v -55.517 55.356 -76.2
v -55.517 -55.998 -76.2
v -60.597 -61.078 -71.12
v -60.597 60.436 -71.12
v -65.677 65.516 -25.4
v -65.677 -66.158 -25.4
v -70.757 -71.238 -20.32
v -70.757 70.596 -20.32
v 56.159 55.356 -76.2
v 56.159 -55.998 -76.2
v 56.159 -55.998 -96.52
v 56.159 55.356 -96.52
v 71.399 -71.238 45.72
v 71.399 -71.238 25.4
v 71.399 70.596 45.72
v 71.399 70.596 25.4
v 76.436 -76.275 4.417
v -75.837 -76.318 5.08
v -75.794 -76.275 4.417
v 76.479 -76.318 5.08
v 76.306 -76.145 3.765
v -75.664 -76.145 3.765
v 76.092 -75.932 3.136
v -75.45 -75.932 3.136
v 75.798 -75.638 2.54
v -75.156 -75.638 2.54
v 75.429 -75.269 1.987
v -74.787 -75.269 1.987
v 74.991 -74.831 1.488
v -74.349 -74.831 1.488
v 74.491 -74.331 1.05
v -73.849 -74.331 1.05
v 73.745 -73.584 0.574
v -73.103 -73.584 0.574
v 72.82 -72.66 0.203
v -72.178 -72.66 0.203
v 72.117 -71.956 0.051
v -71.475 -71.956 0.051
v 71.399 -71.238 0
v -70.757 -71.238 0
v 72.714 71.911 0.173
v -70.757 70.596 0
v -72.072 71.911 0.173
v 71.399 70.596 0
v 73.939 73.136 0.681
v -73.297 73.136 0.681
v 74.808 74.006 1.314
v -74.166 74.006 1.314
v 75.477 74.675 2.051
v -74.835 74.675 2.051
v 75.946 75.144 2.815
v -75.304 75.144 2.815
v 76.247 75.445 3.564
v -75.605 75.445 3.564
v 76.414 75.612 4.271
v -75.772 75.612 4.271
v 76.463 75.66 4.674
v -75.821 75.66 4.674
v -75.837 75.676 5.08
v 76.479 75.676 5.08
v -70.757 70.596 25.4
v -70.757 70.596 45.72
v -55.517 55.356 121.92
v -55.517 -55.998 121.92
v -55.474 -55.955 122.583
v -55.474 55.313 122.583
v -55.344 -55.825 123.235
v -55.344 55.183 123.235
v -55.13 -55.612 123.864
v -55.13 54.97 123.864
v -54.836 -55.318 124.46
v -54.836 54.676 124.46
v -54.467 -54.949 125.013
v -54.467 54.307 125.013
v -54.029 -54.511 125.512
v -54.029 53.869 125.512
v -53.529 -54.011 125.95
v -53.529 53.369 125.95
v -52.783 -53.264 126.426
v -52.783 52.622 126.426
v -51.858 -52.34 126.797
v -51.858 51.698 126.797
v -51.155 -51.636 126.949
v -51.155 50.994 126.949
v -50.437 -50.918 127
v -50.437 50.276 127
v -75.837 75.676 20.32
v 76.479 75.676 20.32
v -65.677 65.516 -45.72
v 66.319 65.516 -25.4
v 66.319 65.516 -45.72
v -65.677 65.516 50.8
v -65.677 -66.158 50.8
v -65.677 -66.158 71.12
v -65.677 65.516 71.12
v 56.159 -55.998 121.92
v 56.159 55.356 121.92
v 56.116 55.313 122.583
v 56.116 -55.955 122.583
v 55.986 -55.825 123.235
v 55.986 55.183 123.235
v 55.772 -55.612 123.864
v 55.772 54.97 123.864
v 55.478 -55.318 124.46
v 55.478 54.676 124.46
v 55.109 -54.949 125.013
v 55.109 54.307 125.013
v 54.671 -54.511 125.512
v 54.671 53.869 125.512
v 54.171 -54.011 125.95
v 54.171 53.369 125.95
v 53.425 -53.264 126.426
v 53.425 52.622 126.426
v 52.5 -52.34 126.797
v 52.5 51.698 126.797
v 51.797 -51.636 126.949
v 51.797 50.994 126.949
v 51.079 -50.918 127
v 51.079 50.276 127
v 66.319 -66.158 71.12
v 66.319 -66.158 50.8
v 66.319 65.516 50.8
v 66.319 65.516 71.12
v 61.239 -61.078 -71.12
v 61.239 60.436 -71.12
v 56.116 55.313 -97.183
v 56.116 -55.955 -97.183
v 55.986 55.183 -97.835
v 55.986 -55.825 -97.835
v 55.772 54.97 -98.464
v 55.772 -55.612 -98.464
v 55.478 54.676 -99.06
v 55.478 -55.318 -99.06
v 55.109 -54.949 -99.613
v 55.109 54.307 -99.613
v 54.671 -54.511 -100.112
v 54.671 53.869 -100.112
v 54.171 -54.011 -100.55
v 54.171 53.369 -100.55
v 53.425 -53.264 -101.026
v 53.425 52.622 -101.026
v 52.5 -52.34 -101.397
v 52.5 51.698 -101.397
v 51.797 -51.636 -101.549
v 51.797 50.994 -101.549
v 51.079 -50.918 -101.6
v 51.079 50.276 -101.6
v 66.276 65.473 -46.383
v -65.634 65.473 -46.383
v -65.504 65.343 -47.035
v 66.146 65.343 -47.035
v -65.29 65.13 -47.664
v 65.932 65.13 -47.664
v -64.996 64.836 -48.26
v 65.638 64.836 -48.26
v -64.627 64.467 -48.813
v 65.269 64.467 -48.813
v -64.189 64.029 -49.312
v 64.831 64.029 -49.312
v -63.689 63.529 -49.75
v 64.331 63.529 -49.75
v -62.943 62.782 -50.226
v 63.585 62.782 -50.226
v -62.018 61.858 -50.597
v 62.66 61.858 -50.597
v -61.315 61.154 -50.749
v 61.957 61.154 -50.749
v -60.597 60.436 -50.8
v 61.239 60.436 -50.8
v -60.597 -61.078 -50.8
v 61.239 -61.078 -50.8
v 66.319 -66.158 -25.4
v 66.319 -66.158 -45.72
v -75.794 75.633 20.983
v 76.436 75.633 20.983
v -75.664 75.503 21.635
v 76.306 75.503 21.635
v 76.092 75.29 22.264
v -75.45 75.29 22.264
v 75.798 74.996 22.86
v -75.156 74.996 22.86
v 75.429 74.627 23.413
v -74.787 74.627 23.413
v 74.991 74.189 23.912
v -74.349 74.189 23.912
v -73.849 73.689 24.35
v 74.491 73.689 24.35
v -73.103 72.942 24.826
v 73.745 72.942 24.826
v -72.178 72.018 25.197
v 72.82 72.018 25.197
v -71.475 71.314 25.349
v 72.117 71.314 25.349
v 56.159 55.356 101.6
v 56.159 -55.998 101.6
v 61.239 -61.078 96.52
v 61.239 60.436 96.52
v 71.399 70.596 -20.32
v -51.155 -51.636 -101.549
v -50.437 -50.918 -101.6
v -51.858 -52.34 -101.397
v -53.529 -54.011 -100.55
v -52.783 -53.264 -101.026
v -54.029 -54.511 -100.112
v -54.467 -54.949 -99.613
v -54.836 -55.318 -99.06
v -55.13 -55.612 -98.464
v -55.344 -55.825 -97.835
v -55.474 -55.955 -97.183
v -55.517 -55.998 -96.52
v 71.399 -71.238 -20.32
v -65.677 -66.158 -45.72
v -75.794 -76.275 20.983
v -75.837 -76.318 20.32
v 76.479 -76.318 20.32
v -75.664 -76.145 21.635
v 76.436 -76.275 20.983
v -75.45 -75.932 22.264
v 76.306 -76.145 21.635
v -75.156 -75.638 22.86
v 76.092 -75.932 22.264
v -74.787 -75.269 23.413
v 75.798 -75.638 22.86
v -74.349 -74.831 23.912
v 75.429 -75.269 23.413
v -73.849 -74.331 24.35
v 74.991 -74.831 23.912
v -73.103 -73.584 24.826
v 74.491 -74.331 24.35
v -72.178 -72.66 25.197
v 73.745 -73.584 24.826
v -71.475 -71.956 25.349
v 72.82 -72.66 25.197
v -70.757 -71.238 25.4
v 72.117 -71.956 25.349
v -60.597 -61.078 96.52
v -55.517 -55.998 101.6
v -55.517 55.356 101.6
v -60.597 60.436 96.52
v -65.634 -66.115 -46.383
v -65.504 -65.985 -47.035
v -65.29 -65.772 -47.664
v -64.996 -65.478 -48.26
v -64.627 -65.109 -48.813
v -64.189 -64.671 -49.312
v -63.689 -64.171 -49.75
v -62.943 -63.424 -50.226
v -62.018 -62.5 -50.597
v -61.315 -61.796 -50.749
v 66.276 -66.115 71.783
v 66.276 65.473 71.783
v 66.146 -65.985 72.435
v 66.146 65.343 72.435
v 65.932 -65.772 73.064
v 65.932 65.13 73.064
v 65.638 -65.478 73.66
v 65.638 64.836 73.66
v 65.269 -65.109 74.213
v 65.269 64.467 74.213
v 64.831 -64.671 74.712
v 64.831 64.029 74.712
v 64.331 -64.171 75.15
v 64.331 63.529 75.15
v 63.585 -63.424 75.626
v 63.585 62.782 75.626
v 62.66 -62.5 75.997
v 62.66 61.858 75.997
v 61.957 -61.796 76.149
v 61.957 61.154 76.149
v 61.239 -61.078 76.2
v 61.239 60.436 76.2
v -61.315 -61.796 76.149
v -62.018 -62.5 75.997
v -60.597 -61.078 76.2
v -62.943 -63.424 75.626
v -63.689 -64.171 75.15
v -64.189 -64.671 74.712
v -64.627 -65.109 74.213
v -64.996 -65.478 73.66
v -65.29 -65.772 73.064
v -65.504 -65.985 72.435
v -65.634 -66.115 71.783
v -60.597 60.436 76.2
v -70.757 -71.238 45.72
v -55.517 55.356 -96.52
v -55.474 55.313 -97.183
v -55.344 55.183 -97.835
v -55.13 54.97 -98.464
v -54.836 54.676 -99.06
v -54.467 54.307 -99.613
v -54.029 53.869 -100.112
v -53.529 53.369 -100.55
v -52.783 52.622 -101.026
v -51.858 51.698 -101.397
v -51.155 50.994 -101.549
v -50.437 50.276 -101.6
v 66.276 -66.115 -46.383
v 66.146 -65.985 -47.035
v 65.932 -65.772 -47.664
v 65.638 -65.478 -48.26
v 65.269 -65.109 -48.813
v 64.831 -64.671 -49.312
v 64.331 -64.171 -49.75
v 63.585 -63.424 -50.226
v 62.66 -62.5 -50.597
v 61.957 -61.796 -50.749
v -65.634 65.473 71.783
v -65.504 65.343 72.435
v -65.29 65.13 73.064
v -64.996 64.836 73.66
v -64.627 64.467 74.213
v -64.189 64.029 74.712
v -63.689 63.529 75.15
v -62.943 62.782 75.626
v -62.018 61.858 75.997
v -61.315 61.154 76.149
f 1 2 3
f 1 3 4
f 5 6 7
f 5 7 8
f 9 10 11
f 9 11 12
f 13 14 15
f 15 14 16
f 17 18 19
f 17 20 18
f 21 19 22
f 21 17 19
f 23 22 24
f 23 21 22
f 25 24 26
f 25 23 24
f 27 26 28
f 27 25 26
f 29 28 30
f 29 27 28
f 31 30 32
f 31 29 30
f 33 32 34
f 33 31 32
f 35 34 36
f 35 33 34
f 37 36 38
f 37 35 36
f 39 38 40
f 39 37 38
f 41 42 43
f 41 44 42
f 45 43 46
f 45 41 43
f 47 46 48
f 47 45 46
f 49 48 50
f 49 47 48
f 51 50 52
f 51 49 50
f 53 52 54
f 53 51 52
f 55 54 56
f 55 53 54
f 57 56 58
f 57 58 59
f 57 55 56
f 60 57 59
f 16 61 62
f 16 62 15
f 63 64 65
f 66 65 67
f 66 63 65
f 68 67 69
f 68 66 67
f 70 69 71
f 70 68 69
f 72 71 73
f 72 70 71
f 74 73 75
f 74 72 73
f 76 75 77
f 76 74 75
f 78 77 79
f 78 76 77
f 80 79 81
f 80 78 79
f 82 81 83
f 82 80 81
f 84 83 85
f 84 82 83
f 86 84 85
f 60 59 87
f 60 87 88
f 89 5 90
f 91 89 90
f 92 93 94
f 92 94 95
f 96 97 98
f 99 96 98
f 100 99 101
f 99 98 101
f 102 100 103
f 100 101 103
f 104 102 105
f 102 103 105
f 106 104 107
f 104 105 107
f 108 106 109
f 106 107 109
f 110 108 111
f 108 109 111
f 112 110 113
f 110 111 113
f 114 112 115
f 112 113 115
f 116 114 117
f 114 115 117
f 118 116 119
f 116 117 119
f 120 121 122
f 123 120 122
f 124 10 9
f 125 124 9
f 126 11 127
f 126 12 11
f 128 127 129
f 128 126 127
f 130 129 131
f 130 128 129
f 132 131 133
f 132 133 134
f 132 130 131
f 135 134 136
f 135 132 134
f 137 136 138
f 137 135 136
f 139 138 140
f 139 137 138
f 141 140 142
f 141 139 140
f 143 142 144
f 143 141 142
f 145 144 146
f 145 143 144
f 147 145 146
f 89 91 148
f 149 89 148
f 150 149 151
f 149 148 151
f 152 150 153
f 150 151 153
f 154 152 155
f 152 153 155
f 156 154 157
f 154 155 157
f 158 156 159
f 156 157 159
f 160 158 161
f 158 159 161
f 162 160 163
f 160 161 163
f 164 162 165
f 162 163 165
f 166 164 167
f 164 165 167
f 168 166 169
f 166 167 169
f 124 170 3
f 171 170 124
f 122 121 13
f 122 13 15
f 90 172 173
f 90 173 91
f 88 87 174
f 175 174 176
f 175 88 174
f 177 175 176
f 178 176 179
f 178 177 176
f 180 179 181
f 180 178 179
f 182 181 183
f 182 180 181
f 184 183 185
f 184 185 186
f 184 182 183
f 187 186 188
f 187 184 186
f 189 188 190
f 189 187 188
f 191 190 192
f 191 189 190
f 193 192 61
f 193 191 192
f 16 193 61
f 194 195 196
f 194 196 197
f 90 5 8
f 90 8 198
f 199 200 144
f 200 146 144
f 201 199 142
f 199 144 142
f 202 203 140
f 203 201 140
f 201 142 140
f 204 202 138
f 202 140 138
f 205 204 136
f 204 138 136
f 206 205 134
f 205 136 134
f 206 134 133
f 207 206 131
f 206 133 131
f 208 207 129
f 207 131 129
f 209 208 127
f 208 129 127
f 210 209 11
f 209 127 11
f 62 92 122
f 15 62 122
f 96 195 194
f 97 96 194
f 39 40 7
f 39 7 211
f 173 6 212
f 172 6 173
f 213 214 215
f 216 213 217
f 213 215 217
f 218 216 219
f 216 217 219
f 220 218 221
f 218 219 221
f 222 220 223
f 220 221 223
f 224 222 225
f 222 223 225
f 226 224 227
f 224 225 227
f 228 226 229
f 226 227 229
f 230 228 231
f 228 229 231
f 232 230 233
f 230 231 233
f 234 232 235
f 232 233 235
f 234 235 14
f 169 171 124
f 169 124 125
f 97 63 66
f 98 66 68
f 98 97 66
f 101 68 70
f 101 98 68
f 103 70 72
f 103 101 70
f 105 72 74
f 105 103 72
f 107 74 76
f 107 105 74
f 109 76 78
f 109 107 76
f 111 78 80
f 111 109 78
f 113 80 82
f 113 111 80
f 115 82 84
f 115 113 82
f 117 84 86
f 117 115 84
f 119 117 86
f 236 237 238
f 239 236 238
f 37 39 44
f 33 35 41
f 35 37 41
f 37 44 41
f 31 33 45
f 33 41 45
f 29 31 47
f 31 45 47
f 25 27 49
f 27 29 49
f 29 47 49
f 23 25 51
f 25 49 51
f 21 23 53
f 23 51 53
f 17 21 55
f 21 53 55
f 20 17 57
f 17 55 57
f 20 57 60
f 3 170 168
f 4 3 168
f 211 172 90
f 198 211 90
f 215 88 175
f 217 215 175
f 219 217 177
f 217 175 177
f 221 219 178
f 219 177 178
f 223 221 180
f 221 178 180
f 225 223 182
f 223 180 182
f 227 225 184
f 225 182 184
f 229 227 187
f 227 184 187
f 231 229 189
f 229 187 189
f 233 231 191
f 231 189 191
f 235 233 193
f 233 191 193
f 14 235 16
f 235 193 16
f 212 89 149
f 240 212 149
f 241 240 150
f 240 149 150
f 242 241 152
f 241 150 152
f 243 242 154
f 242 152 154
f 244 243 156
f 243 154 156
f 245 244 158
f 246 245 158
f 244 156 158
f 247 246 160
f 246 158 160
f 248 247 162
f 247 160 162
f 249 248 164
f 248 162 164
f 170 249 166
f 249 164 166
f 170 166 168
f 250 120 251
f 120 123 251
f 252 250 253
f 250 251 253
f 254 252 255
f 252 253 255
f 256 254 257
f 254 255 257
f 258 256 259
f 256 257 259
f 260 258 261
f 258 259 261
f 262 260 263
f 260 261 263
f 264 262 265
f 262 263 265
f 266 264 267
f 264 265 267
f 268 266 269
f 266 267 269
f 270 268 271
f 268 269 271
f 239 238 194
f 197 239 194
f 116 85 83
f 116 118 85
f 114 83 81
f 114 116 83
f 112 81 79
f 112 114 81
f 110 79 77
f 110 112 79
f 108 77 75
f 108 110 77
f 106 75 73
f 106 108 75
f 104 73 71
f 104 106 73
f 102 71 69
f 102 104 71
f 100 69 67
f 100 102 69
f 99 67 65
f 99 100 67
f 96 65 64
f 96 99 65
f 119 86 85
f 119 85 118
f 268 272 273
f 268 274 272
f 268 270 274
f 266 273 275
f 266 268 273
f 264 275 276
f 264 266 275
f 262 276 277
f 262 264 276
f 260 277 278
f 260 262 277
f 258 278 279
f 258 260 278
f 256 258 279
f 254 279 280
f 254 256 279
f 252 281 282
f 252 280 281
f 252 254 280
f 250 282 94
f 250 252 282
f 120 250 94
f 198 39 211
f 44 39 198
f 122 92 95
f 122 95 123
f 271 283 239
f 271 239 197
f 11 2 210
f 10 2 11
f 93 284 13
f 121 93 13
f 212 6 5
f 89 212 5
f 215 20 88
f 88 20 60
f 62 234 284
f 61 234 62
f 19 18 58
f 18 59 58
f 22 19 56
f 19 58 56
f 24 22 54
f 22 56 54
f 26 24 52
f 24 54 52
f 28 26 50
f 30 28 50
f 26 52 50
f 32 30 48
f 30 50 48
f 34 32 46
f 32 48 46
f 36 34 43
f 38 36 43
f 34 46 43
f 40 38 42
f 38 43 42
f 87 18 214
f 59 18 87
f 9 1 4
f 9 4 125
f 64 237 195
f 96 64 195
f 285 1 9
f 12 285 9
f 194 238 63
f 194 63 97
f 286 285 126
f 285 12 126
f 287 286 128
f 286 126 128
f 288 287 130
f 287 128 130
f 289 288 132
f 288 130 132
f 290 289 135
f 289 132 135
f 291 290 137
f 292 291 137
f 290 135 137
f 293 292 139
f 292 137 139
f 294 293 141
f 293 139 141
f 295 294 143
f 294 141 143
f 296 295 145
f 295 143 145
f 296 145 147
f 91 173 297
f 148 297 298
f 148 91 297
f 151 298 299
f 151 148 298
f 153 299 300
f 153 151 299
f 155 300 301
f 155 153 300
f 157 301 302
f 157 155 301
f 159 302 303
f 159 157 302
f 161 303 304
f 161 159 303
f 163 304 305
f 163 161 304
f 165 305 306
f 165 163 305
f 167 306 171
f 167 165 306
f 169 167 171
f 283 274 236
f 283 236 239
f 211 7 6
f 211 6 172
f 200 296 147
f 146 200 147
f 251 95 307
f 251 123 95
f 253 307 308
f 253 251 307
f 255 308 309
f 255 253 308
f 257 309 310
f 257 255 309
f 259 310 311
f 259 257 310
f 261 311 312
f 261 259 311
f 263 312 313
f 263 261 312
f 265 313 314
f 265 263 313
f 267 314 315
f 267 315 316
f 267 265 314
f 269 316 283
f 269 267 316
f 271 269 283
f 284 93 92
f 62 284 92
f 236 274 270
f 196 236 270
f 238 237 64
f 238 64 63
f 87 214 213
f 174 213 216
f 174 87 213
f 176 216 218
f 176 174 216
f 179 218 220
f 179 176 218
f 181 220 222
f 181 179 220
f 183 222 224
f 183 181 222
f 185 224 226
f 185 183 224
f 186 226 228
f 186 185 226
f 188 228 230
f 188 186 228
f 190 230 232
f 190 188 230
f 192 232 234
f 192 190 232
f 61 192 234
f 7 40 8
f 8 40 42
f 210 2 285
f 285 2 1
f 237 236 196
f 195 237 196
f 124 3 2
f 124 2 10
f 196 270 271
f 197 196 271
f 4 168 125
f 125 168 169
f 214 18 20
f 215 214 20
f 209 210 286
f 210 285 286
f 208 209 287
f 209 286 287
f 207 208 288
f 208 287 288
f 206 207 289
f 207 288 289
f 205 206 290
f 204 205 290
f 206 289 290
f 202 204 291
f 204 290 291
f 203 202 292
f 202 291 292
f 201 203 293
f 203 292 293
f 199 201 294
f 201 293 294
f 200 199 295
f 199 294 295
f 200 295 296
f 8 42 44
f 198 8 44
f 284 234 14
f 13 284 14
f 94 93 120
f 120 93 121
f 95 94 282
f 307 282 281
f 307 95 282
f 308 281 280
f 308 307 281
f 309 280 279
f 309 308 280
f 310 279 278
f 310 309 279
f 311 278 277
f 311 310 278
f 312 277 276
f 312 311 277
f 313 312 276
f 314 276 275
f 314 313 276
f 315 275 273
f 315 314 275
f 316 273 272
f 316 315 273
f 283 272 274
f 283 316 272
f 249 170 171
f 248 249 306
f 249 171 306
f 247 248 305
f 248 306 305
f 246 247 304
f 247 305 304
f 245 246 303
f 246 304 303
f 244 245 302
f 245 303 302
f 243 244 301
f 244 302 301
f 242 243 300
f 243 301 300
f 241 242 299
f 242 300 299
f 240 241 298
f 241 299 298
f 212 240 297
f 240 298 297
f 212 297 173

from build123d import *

# Parameters (mm, degrees)
F0_W      = 152.3159295321
F0_H      = 151.994921267
F1_DEPTH  = 25.4
F2_R      = 5.08
F3_R      = 5.08
F4_DEPTH  = 25.4
F5_SIZE   = 5.08
F6_DEPTH  = 25.4
F7_SIZE   = 5.08
F8_DEPTH  = 25.4
F9_R      = 5.08
F10_DEPTH = 25.4
F11_R     = 5.08
F12_DEPTH = 25.4
F13_SIZE  = 5.08
F14_DEPTH = 25.4
F15_SIZE  = 5.08
F16_DEPTH = 25.4
F17_R     = 5.08
F18_DEPTH = 25.4
F19_R     = 5.08


with BuildPart() as f1:
    # F0 (on Top) → F1 (new body)
    with BuildSketch(Plane.XY):
        with Locations((0.3210008144, -0.3210045397)):
            Rectangle(F0_W, F0_H)
    extrude(amount=F1_DEPTH)

    # F2
    f2_edges = [f1.edges().sort_by_distance(p)[0] for p in [
        (0.321001, 75.676456, 25.4),
        (-75.836964, -0.321005, 25.4),
        (0.321001, -76.318465, 25.4),
        (76.478966, -0.321005, 25.4),
    ]]
    fillet(f2_edges, radius=F2_R)

    # F3
    f3_edges = [f1.edges().sort_by_distance(p)[0] for p in [
        (0.321001, 75.676456, 0),
        (-75.836964, -0.321005, 0),
        (0.321001, -76.318465, 0),
        (76.478966, -0.321005, 0),
    ]]
    fillet(f3_edges, radius=F3_R)

    # F4 (add): a face of the model
    f4_faces = [f1.faces().sort_by_distance(p)[0] for p in [
        (0.3210008144, -0.3210045397, 0),
    ]]
    extrude(f4_faces, amount=F4_DEPTH)

    # F5
    f5_edges = [f1.edges().sort_by_distance(p)[0] for p in [
        (0.321001, 70.596456, -25.4),
        (71.398966, -0.321005, -25.4),
        (-70.756964, -0.321005, -25.4),
        (0.321001, -71.238465, -25.4),
    ]]
    chamfer(f5_edges, length=F5_SIZE)

    # F6 (add): a face of the model
    f6_faces = [f1.faces().sort_by_distance(p)[0] for p in [
        (0.3210008144, -0.3210045397, 25.4),
    ]]
    extrude(f6_faces, amount=F6_DEPTH)

    # F7
    f7_edges = [f1.edges().sort_by_distance(p)[0] for p in [
        (0.321001, 70.596456, 50.8),
        (71.398966, -0.321005, 50.8),
        (-70.756964, -0.321005, 50.8),
        (0.321001, -71.238465, 50.8),
    ]]
    chamfer(f7_edges, length=F7_SIZE)

    # F8 (add): a face of the model
    f8_faces = [f1.faces().sort_by_distance(p)[0] for p in [
        (0.3210008144, -0.3210045397, 50.8),
    ]]
    extrude(f8_faces, amount=F8_DEPTH)

    # F9
    f9_edges = [f1.edges().sort_by_distance(p)[0] for p in [
        (0.321001, 65.516456, 76.2),
        (66.318966, -0.321005, 76.2),
        (-65.676964, -0.321005, 76.2),
        (0.321001, -66.158465, 76.2),
    ]]
    fillet(f9_edges, radius=F9_R)

    # F10 (add): a face of the model
    f10_faces = [f1.faces().sort_by_distance(p)[0] for p in [
        (0.3210008144, -0.3210045397, -25.4),
    ]]
    extrude(f10_faces, amount=F10_DEPTH)

    # F11
    f11_edges = [f1.edges().sort_by_distance(p)[0] for p in [
        (0.321001, 65.516456, -50.8),
        (66.318966, -0.321005, -50.8),
        (-65.676964, -0.321005, -50.8),
        (0.321001, -66.158465, -50.8),
    ]]
    fillet(f11_edges, radius=F11_R)

    # F12 (add): a face of the model
    f12_faces = [f1.faces().sort_by_distance(p)[0] for p in [
        (0.3210008144, -0.3210045397, -50.8),
    ]]
    extrude(f12_faces, amount=F12_DEPTH)

    # F13
    f13_edges = [f1.edges().sort_by_distance(p)[0] for p in [
        (0.321001, 60.436456, -76.2),
        (61.238966, -0.321005, -76.2),
        (-60.596964, -0.321005, -76.2),
        (0.321001, -61.078465, -76.2),
    ]]
    chamfer(f13_edges, length=F13_SIZE)

    # F14 (add): a face of the model
    f14_faces = [f1.faces().sort_by_distance(p)[0] for p in [
        (0.3210008144, -0.3210045397, 76.2),
    ]]
    extrude(f14_faces, amount=F14_DEPTH)

    # F15
    f15_edges = [f1.edges().sort_by_distance(p)[0] for p in [
        (0.321001, 60.436456, 101.6),
        (61.238966, -0.321005, 101.6),
        (-60.596964, -0.321005, 101.6),
        (0.321001, -61.078465, 101.6),
    ]]
    chamfer(f15_edges, length=F15_SIZE)

    # F16 (add): a face of the model
    f16_faces = [f1.faces().sort_by_distance(p)[0] for p in [
        (0.3210008144, -0.3210045397, 101.6),
    ]]
    extrude(f16_faces, amount=F16_DEPTH)

    # F17
    f17_edges = [f1.edges().sort_by_distance(p)[0] for p in [
        (0.321001, 55.356456, 127),
        (56.158966, -0.321005, 127),
        (-55.516964, -0.321005, 127),
        (0.321001, -55.998465, 127),
    ]]
    fillet(f17_edges, radius=F17_R)

    # F18 (add): a face of the model
    f18_faces = [f1.faces().sort_by_distance(p)[0] for p in [
        (0.3210008144, -0.3210045397, -76.2),
    ]]
    extrude(f18_faces, amount=F18_DEPTH)

    # F19
    f19_edges = [f1.edges().sort_by_distance(p)[0] for p in [
        (0.321001, 55.356456, -101.6),
        (56.158966, -0.321005, -101.6),
        (-55.516964, -0.321005, -101.6),
        (0.321001, -55.998465, -101.6),
    ]]
    fillet(f19_edges, radius=F19_R)


solid = f1.part
